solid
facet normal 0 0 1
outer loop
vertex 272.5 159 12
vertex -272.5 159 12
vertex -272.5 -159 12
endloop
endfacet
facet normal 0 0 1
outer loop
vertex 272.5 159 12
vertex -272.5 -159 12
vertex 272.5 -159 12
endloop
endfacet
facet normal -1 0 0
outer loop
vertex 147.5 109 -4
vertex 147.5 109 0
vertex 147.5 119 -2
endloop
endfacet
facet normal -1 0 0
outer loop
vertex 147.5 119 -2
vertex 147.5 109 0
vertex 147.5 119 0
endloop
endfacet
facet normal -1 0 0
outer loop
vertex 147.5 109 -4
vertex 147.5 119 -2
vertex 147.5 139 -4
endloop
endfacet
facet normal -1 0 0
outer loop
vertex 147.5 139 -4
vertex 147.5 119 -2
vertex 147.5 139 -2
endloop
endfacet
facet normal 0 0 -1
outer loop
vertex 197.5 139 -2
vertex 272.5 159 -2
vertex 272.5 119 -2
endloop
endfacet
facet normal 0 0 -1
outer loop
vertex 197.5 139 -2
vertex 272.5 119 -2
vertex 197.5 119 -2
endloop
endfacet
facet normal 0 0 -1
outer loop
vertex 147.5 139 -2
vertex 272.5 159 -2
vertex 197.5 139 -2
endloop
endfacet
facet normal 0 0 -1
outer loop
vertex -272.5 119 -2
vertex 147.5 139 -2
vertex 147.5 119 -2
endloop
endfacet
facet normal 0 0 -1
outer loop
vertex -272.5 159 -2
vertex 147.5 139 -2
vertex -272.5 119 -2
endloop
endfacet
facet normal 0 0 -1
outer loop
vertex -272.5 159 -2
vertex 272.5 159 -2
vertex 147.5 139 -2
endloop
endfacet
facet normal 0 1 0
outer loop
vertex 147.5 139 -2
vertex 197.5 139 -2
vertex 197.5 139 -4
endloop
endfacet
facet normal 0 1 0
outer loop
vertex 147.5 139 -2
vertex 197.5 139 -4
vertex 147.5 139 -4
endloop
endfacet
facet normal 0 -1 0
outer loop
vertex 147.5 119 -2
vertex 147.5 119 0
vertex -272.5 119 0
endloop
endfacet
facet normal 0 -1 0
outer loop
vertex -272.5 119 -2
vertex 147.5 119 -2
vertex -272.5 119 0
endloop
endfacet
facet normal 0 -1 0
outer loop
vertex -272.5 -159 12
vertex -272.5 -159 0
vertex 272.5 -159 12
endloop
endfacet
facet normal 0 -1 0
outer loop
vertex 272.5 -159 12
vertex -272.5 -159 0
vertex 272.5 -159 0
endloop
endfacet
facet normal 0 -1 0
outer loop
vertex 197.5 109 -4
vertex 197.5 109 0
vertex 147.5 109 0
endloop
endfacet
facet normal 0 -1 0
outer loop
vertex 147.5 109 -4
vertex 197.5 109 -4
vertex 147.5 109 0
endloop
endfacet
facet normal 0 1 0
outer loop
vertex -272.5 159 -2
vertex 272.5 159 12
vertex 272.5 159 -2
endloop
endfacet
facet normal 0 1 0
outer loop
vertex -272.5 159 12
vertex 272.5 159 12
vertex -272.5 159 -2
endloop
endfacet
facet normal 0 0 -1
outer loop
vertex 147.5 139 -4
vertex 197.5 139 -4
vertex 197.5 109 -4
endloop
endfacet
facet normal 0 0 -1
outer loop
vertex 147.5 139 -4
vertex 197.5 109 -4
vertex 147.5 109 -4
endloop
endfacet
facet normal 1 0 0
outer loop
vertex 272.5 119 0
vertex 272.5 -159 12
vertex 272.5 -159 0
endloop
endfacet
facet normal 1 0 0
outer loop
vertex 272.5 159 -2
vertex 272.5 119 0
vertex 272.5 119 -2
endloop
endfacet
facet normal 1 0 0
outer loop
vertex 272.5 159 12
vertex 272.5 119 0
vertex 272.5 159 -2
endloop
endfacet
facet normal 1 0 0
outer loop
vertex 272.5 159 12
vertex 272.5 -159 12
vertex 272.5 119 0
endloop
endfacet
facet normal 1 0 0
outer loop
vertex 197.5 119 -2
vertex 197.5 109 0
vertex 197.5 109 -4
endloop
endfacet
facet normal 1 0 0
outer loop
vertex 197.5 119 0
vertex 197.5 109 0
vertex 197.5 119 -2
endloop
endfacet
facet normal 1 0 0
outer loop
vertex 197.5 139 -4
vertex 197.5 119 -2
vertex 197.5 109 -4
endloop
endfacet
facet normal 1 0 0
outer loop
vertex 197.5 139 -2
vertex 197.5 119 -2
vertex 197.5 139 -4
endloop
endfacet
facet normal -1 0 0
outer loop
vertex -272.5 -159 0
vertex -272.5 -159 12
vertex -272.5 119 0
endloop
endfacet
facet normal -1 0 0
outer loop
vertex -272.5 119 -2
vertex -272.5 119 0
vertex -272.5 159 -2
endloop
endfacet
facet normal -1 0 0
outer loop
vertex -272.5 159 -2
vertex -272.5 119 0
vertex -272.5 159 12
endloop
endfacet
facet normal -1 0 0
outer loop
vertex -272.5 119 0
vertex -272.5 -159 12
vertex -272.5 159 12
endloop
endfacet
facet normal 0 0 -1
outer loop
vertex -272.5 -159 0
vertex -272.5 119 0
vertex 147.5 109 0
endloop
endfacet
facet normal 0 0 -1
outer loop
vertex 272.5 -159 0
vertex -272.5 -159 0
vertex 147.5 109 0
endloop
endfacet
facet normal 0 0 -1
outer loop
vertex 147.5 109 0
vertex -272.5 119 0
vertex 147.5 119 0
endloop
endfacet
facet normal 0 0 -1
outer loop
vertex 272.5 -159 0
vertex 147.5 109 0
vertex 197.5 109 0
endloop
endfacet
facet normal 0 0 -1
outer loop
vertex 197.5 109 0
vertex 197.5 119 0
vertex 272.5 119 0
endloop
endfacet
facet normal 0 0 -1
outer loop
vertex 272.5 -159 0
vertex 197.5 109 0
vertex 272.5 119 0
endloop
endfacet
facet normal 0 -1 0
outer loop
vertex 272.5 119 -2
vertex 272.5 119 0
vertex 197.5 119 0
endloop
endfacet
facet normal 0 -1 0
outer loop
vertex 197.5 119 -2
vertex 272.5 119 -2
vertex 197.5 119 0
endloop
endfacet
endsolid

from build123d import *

# Parameters (mm, degrees)
ESQUISSE1_W        = 545
ESQUISSE1_H        = 318
BOSS_EXTRU_1_DEPTH = 12
ESQUISSE2_W        = 545
ESQUISSE2_H        = 40
BOSS_EXTRU_2_DEPTH = 2
ESQUISSE3_W        = 50
ESQUISSE3_H        = 30
BOSS_EXTRU_3_DEPTH = 4


with BuildPart() as part:
    # Esquisse1 → Boss.-Extru.1 (new body)
    with BuildSketch(Plane.XY):
        Rectangle(ESQUISSE1_W, ESQUISSE1_H)
    extrude(amount=BOSS_EXTRU_1_DEPTH)

    # Esquisse2 → Boss.-Extru.2 (add)
    with BuildSketch(Plane(origin=(0, 0, 0), x_dir=(-1, 0, 0), z_dir=(0, 0, -1))):
        with Locations((0, 139)):
            Rectangle(ESQUISSE2_W, ESQUISSE2_H)
    extrude(amount=BOSS_EXTRU_2_DEPTH)

    # Esquisse3 → Boss.-Extru.3 (add)
    with BuildSketch(Plane(origin=(0, 0, 0), x_dir=(-1, 0, 0), z_dir=(0, 0, -1))):
        with Locations((-172.5, 124)):
            Rectangle(ESQUISSE3_W, ESQUISSE3_H)
    extrude(amount=BOSS_EXTRU_3_DEPTH)


solid = part.part
